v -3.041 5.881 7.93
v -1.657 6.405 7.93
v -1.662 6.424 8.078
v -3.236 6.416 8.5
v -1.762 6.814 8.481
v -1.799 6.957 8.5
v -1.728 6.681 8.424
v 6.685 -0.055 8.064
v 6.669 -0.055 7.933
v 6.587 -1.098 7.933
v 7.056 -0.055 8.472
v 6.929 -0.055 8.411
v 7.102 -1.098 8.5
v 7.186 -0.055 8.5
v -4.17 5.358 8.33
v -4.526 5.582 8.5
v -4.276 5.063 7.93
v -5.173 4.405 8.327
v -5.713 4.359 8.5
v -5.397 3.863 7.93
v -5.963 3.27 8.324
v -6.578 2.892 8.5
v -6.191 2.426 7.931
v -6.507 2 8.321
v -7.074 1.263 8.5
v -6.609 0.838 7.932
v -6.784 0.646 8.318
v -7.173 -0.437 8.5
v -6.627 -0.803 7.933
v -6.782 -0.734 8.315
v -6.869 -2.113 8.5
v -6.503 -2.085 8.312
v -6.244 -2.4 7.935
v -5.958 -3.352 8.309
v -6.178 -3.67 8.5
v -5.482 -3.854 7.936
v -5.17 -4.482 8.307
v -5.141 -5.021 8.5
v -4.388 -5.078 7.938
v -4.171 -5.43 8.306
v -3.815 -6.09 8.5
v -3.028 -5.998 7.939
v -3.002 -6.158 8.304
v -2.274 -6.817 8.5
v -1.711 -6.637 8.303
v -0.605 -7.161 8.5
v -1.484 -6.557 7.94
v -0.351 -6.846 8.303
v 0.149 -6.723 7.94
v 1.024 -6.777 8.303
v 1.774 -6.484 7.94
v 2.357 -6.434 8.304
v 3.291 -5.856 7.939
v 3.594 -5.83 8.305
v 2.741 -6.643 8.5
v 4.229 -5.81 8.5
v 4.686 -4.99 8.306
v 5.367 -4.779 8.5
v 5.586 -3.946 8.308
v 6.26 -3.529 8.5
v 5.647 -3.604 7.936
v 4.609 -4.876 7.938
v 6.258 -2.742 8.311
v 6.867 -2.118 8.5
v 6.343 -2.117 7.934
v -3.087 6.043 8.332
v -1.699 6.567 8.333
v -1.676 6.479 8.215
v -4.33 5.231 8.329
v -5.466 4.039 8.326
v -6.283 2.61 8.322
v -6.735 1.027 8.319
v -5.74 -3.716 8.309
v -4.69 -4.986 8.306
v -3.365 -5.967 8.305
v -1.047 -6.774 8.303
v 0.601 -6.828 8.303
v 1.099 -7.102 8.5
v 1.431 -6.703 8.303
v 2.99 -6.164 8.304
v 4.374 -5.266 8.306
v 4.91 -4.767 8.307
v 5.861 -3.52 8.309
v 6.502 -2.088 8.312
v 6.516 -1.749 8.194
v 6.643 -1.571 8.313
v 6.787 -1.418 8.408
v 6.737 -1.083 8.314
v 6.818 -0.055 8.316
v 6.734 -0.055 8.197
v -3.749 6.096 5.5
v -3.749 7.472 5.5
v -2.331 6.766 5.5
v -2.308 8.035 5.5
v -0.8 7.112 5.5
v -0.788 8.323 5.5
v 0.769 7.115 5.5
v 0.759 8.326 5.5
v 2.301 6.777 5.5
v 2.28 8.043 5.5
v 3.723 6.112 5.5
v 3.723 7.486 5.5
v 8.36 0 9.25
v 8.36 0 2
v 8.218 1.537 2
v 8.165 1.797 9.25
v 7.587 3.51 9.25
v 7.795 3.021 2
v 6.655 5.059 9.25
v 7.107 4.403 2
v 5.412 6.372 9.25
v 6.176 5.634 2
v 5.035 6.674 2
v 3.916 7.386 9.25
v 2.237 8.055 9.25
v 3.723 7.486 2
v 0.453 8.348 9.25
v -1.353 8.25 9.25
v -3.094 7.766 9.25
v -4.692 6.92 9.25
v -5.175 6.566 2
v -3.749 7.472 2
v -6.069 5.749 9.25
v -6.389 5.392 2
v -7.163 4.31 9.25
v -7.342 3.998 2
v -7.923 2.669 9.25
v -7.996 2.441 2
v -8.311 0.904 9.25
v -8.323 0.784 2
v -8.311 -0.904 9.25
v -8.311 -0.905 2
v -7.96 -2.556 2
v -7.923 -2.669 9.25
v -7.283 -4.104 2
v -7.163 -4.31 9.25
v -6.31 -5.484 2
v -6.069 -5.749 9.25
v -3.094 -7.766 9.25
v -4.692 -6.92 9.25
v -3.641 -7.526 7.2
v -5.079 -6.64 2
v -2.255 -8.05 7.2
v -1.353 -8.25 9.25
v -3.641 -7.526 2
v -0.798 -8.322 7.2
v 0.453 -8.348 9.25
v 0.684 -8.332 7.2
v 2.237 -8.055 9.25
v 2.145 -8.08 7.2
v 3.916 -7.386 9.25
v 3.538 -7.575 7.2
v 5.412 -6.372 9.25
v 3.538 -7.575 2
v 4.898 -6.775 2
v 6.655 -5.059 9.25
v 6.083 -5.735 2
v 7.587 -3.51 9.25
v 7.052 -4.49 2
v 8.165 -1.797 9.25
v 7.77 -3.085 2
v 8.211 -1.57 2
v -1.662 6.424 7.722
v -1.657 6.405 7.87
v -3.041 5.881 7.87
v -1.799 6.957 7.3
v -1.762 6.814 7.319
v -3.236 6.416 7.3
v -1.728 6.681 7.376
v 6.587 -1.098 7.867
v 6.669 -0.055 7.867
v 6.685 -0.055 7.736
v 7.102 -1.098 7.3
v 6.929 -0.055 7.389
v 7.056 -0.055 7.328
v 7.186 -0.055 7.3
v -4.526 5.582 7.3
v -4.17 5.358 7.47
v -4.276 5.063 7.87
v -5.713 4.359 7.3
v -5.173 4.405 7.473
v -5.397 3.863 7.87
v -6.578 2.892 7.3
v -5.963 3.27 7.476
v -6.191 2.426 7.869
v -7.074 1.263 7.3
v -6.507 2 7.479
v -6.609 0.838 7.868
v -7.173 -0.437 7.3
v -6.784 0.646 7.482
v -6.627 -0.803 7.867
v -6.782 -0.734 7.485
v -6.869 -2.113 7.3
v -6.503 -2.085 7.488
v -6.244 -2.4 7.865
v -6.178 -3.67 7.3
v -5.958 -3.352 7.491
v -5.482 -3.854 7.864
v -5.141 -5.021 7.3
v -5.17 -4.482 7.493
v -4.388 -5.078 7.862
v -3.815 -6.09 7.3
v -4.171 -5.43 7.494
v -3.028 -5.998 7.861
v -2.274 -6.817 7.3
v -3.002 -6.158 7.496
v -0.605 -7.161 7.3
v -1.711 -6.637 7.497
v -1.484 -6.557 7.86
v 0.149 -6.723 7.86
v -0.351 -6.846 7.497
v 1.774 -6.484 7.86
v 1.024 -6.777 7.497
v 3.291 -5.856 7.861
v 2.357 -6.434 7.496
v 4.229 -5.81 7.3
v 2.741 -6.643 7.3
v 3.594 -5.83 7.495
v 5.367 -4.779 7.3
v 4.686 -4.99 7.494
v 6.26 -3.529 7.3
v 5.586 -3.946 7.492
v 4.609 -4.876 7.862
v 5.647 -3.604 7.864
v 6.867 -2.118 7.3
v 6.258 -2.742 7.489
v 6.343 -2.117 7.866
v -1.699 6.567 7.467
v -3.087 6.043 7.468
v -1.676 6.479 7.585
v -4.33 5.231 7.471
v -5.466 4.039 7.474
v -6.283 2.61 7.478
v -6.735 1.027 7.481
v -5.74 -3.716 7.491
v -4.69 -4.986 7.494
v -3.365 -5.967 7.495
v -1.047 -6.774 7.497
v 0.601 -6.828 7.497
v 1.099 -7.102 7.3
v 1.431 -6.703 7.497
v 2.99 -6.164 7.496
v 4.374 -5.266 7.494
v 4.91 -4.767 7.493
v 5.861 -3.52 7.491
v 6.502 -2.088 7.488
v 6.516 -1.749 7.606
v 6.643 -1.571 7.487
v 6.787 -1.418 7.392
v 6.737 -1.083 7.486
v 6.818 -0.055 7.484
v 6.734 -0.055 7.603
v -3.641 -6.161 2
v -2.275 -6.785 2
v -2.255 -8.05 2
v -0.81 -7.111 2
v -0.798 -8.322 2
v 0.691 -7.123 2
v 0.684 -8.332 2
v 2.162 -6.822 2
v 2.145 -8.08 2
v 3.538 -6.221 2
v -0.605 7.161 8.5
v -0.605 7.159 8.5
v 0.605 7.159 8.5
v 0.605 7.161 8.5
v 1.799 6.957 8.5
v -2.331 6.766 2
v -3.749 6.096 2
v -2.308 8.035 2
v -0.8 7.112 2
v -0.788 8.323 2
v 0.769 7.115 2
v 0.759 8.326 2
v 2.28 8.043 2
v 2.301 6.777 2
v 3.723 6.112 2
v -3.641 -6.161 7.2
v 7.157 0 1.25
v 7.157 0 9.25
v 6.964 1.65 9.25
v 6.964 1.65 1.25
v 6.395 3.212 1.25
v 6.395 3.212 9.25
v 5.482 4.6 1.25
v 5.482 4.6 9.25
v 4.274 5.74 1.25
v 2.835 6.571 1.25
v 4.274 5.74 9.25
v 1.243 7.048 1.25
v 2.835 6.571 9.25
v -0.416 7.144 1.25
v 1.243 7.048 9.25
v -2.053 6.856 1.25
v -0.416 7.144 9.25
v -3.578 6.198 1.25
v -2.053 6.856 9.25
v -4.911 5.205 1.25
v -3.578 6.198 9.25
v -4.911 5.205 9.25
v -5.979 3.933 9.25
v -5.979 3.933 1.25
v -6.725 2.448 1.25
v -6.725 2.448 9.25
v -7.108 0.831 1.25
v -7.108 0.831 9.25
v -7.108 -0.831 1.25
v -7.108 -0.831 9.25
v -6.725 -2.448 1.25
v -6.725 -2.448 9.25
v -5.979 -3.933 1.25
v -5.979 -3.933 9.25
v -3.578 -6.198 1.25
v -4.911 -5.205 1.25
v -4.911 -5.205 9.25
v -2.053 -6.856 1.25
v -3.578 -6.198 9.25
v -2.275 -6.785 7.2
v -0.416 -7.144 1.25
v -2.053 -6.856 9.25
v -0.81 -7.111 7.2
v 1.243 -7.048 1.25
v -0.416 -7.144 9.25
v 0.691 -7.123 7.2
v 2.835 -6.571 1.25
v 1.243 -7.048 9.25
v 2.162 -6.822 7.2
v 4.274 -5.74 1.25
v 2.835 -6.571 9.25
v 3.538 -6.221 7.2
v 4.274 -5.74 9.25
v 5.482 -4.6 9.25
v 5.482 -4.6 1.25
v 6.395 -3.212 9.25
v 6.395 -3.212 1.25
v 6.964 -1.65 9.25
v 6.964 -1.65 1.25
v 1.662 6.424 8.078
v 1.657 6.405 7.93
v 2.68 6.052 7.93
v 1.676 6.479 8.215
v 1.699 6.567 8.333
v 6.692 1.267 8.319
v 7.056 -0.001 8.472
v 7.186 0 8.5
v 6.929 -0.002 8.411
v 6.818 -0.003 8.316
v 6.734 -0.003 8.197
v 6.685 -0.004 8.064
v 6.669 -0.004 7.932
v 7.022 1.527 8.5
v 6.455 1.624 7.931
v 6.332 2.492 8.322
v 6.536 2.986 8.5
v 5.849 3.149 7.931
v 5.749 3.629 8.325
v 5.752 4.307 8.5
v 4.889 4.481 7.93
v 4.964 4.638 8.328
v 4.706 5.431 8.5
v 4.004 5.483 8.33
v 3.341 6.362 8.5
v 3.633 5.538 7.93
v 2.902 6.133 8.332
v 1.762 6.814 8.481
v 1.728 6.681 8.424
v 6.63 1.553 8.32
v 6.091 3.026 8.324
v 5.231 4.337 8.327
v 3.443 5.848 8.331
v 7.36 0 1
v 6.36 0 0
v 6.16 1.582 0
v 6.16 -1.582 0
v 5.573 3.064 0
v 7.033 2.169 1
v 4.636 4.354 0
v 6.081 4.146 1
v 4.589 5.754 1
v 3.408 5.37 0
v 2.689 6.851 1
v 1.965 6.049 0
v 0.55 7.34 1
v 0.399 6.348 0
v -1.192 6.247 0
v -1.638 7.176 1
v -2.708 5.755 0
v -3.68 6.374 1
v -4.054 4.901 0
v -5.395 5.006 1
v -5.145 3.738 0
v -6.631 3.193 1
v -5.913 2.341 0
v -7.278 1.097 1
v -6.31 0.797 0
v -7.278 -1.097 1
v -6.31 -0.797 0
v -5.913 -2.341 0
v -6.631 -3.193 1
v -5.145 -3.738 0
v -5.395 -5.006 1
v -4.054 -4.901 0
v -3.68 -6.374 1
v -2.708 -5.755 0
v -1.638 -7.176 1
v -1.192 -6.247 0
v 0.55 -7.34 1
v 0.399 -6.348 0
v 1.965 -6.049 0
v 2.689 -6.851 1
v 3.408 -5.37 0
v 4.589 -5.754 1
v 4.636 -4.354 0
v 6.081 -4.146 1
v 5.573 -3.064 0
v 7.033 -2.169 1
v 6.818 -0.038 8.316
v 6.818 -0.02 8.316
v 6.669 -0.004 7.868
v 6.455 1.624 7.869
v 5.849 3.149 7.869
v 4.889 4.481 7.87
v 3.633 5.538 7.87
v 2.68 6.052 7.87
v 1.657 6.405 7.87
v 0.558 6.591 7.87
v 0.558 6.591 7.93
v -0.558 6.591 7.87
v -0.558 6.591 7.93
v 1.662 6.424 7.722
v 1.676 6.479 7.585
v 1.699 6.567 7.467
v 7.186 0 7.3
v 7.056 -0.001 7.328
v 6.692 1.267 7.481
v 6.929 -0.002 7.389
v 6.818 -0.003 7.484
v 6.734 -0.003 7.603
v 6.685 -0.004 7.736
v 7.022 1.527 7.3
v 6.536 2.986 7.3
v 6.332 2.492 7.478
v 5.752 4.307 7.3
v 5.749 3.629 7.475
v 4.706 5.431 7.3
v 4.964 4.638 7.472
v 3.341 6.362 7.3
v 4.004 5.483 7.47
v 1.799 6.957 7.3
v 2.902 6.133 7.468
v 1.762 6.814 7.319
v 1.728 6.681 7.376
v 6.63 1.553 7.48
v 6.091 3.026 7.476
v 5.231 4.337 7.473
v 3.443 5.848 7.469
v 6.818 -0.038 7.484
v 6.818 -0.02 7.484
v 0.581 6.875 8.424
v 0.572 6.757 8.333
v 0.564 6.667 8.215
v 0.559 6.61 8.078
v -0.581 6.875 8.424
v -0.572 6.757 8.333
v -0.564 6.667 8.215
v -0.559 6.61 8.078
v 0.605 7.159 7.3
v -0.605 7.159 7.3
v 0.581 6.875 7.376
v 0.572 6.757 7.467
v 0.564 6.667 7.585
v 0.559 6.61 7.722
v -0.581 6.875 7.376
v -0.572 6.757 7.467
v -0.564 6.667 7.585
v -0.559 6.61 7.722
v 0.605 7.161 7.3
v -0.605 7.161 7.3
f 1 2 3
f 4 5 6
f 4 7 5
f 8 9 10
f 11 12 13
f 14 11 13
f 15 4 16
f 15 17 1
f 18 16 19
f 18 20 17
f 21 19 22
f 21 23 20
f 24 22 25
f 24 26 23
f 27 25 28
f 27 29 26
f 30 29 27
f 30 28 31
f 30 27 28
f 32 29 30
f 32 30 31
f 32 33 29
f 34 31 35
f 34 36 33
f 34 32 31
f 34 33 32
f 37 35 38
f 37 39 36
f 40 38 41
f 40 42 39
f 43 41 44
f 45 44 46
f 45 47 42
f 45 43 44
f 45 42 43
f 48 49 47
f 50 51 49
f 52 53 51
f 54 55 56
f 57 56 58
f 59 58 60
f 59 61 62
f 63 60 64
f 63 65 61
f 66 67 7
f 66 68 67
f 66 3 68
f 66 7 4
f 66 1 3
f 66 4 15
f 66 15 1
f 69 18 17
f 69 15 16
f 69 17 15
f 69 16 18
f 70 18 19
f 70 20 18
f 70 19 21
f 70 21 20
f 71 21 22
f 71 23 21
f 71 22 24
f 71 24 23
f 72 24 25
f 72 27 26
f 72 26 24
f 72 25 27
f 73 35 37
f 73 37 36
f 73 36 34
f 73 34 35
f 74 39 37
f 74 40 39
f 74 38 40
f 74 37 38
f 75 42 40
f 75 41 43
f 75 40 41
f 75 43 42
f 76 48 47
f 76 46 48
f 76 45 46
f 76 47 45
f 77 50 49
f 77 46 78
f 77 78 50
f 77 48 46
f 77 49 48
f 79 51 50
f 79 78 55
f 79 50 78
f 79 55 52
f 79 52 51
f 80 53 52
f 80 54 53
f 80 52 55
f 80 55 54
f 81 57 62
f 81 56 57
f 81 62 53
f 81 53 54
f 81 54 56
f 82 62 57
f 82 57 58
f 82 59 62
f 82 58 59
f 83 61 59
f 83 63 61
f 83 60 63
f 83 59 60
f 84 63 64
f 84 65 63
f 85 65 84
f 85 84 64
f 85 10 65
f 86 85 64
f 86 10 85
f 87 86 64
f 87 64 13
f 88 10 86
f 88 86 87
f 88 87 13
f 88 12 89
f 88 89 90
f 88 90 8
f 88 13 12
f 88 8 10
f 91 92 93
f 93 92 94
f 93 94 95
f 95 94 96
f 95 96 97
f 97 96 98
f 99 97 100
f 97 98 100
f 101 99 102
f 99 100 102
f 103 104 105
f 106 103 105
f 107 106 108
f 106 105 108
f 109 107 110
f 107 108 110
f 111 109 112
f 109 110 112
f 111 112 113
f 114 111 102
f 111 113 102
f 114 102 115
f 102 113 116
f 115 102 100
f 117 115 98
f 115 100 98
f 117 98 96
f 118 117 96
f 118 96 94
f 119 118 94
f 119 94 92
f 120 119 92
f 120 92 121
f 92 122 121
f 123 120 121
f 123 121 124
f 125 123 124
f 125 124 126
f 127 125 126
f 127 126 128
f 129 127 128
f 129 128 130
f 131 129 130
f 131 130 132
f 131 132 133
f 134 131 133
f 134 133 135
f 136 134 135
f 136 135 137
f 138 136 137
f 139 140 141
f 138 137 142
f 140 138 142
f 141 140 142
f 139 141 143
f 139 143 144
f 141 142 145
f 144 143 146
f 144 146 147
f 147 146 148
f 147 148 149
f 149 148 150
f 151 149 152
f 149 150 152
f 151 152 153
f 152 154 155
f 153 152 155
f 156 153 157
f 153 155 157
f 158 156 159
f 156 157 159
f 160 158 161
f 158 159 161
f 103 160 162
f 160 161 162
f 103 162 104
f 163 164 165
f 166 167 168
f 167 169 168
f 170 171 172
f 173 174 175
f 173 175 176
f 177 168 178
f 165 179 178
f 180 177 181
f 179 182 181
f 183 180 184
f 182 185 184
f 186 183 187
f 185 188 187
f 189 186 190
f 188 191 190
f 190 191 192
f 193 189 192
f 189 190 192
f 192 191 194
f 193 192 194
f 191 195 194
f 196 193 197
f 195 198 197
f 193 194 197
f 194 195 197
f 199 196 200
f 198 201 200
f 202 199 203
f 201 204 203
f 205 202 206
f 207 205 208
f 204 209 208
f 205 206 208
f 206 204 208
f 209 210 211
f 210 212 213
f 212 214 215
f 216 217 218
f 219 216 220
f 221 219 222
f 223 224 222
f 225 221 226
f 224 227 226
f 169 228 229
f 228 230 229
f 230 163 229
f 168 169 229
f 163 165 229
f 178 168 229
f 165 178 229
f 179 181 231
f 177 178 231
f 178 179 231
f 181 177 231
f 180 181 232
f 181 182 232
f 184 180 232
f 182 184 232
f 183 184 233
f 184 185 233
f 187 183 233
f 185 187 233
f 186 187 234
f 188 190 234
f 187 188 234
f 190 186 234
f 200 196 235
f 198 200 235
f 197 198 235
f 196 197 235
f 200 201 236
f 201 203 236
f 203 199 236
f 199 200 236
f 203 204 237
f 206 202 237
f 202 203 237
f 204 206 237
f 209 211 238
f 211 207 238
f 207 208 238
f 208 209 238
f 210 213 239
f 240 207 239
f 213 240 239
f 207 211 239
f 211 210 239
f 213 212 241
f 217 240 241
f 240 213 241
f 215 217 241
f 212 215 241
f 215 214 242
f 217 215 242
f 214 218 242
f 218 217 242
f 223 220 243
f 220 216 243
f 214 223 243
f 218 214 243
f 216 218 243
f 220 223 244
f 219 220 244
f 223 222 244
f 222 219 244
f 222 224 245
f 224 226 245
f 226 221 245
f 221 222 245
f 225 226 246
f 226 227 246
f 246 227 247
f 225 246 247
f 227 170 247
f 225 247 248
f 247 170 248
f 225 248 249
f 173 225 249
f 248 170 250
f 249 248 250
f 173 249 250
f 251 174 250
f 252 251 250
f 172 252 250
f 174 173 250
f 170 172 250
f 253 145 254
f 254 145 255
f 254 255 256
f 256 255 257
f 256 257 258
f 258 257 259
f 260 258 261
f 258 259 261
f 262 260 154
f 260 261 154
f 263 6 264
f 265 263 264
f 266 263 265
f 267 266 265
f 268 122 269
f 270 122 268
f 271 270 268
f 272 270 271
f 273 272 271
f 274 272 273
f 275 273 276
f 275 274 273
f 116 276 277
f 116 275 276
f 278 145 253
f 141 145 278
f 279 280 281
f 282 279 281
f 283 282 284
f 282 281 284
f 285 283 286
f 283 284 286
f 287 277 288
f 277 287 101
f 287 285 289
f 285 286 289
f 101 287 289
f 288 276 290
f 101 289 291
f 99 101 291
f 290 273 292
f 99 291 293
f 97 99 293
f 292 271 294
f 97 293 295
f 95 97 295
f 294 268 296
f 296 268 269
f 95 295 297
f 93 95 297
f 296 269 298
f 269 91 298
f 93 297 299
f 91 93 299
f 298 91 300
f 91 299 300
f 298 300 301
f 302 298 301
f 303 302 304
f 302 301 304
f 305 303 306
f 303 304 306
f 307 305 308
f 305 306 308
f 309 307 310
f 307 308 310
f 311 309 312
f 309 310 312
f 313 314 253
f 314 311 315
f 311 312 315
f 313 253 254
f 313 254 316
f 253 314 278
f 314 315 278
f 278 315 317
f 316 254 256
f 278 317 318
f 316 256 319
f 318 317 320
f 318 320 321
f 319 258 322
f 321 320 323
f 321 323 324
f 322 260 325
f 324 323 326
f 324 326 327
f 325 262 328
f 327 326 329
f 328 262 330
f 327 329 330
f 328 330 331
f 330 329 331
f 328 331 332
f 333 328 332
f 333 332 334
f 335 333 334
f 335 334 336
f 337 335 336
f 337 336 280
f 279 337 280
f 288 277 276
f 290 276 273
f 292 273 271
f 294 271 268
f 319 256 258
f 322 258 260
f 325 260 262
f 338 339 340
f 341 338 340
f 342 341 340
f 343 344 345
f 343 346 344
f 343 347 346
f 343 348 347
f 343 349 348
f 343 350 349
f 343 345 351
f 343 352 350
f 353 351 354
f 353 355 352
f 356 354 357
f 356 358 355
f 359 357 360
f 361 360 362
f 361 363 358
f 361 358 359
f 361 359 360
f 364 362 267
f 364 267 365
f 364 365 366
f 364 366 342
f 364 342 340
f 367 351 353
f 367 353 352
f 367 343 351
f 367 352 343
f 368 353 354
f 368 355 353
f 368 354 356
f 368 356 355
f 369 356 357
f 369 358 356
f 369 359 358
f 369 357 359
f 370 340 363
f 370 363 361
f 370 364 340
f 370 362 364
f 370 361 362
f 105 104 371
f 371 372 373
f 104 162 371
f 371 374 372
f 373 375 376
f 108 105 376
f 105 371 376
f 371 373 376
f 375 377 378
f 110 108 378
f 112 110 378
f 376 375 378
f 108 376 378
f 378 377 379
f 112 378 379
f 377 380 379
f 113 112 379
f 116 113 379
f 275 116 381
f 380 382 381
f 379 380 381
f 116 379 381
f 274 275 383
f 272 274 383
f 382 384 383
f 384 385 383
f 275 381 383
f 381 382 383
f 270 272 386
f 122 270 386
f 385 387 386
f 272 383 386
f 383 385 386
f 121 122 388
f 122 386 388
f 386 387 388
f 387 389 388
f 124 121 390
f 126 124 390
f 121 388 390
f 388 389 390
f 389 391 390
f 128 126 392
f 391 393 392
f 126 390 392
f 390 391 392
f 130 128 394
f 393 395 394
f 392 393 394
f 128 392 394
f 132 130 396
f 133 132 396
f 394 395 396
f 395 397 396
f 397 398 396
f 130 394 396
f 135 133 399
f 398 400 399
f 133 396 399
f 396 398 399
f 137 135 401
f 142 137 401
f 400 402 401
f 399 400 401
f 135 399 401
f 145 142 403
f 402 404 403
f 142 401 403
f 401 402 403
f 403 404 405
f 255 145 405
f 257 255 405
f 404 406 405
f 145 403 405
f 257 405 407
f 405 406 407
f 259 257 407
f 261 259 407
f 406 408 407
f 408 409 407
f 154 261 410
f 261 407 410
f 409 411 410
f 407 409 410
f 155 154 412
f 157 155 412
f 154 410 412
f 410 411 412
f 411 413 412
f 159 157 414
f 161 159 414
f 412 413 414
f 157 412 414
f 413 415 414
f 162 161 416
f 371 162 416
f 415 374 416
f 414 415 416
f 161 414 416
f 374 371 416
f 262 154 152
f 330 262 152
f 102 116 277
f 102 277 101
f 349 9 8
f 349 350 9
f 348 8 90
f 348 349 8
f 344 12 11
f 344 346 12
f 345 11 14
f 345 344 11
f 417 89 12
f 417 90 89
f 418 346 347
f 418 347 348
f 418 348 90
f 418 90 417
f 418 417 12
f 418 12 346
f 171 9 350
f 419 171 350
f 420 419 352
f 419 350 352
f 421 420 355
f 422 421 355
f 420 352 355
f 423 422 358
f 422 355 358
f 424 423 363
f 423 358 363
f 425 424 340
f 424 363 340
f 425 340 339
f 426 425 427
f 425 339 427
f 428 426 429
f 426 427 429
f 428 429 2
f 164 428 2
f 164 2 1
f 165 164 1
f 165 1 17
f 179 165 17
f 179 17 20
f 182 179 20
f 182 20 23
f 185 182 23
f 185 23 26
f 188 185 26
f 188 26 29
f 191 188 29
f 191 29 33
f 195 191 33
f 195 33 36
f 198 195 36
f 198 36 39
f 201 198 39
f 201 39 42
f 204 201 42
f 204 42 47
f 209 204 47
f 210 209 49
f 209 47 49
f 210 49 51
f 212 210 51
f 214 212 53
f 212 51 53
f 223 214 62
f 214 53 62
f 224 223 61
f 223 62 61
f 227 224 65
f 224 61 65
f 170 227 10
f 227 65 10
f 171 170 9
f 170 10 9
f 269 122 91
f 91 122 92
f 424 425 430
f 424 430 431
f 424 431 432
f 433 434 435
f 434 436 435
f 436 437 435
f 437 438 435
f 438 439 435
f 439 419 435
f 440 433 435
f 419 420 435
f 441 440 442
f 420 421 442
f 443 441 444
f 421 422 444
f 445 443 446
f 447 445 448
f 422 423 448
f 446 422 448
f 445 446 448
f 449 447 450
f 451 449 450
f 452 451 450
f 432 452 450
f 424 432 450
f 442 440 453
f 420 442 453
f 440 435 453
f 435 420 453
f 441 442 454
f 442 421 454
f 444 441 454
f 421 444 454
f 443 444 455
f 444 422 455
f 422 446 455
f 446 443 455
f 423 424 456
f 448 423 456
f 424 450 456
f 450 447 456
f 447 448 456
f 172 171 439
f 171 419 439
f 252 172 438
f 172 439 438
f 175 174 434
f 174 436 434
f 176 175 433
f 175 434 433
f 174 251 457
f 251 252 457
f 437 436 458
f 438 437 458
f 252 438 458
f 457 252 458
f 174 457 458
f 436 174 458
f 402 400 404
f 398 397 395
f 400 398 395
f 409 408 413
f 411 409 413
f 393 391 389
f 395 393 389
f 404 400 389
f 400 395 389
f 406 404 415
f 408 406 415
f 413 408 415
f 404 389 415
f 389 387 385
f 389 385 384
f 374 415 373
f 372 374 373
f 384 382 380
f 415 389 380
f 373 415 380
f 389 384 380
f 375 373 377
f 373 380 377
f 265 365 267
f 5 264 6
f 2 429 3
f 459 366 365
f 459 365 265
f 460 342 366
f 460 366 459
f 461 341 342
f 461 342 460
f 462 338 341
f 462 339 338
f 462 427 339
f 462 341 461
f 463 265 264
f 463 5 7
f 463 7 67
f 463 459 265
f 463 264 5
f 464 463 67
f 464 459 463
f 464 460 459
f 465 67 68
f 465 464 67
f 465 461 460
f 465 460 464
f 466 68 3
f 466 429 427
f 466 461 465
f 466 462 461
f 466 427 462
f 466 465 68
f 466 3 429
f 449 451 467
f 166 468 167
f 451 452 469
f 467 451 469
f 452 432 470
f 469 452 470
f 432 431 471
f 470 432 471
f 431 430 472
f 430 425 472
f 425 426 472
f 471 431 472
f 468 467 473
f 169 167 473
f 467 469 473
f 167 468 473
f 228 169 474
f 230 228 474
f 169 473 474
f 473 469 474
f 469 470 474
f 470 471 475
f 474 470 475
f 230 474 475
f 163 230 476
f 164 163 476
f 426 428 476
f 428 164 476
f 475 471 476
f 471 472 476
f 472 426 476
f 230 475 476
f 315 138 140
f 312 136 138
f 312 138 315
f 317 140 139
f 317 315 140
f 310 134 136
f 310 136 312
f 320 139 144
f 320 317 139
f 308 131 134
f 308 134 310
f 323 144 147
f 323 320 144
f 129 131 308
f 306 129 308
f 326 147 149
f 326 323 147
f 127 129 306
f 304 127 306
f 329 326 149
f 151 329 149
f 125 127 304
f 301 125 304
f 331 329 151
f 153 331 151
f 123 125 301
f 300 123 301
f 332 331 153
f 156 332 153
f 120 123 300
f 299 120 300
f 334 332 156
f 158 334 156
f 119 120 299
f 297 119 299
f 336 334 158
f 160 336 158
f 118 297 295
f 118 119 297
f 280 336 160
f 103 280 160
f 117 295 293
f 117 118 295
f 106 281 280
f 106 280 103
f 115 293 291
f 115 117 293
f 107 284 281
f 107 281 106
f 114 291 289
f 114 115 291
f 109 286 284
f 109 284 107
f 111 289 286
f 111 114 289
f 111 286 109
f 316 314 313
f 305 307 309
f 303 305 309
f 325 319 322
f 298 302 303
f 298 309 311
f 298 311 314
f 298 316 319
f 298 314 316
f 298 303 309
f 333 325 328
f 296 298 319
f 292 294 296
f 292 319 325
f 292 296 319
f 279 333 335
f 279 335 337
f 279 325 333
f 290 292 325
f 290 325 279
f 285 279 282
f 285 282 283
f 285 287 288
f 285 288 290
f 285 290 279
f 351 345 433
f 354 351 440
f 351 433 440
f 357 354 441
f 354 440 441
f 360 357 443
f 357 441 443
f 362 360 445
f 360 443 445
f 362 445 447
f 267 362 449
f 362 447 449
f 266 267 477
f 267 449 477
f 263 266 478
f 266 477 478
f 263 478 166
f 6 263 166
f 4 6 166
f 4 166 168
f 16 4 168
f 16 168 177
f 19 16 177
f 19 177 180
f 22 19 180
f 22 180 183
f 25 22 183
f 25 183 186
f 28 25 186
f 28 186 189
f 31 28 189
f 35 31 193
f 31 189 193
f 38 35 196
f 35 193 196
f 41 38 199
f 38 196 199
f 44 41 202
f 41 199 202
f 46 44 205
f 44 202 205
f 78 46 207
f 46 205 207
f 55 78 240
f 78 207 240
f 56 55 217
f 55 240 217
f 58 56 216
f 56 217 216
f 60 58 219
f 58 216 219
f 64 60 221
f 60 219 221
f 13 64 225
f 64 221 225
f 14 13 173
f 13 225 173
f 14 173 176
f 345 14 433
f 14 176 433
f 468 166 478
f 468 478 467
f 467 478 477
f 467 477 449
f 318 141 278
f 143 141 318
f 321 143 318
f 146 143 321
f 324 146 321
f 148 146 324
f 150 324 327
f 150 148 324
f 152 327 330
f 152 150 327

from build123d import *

# Parameters (mm, degrees)
SKETCH002_R     = 7.18617
PAD001_DEPTH    = 1.2
SKETCH005_R     = 6.669459
POCKET001_DEPTH = 5
FILLET_R        = 0.57
SKETCH007_W     = 7.178695
SKETCH007_H     = 5.2
PAD004_DEPTH    = 15
SKETCH006_W     = 7.471976
SKETCH006_H     = 3.5
PAD003_DEPTH    = 20
SKETCH_R        = 8.360127
PAD_DEPTH       = 9.25
SKETCH001_R     = 7.156563
POCKET_DEPTH    = 8
CHAMFER_SIZE    = 2


with BuildPart() as fillet_body:
    # Sketch002 → Pad001 (new body)
    with BuildSketch(Plane.XY.offset(7.3)):
        Circle(SKETCH002_R)
    extrude(amount=PAD001_DEPTH)

    # Sketch005 → Pocket001 (cut)
    with BuildSketch(Plane.XY.offset(8.5)):
        with Locations((0, -0.055028)):
            Circle(SKETCH005_R)
    extrude(amount=-POCKET001_DEPTH, mode=Mode.SUBTRACT)

    # Fillet
    fillet_edges = [fillet_body.edges().sort_by_distance(p)[0] for p in [
        (-6.669459, -0.055028, 8.5),
        (-6.669459, -0.055028, 7.3),
    ]]
    fillet(fillet_edges, radius=FILLET_R)


with BuildPart() as pad004:
    # Sketch007 → Pad004 (new body)
    with BuildSketch(Plane.XZ.offset(20)):
        with Locations((-0.051548, 4.6)):
            Rectangle(SKETCH007_W, SKETCH007_H)
    extrude(amount=-PAD004_DEPTH)


with BuildPart() as pad003:
    # Sketch006 → Pad003 (new body)
    with BuildSketch(Plane.XZ.offset(-20)):
        with Locations((-0.013385, 3.75)):
            Rectangle(SKETCH006_W, SKETCH006_H)
    extrude(amount=PAD003_DEPTH)


with BuildPart() as cut001:
    # Sketch → Pad (new body)
    with BuildSketch(Plane.XY):
        Circle(SKETCH_R)
    extrude(amount=PAD_DEPTH)

    # Sketch001 → Pocket (cut)
    with BuildSketch(Plane.XY.offset(9.25)):
        Circle(SKETCH001_R)
    extrude(amount=-POCKET_DEPTH, mode=Mode.SUBTRACT)

    # Chamfer
    chamfer_edges = [cut001.edges().sort_by_distance(p)[0] for p in [
        (-8.360127, 0, 0),
    ]]
    chamfer(chamfer_edges, length=CHAMFER_SIZE)

    # Cut: cut Pad003
    add(pad003.part, mode=Mode.SUBTRACT)

    # Cut001: cut Pad004
    add(pad004.part, mode=Mode.SUBTRACT)


solid = Compound([fillet_body.part, cut001.part])
